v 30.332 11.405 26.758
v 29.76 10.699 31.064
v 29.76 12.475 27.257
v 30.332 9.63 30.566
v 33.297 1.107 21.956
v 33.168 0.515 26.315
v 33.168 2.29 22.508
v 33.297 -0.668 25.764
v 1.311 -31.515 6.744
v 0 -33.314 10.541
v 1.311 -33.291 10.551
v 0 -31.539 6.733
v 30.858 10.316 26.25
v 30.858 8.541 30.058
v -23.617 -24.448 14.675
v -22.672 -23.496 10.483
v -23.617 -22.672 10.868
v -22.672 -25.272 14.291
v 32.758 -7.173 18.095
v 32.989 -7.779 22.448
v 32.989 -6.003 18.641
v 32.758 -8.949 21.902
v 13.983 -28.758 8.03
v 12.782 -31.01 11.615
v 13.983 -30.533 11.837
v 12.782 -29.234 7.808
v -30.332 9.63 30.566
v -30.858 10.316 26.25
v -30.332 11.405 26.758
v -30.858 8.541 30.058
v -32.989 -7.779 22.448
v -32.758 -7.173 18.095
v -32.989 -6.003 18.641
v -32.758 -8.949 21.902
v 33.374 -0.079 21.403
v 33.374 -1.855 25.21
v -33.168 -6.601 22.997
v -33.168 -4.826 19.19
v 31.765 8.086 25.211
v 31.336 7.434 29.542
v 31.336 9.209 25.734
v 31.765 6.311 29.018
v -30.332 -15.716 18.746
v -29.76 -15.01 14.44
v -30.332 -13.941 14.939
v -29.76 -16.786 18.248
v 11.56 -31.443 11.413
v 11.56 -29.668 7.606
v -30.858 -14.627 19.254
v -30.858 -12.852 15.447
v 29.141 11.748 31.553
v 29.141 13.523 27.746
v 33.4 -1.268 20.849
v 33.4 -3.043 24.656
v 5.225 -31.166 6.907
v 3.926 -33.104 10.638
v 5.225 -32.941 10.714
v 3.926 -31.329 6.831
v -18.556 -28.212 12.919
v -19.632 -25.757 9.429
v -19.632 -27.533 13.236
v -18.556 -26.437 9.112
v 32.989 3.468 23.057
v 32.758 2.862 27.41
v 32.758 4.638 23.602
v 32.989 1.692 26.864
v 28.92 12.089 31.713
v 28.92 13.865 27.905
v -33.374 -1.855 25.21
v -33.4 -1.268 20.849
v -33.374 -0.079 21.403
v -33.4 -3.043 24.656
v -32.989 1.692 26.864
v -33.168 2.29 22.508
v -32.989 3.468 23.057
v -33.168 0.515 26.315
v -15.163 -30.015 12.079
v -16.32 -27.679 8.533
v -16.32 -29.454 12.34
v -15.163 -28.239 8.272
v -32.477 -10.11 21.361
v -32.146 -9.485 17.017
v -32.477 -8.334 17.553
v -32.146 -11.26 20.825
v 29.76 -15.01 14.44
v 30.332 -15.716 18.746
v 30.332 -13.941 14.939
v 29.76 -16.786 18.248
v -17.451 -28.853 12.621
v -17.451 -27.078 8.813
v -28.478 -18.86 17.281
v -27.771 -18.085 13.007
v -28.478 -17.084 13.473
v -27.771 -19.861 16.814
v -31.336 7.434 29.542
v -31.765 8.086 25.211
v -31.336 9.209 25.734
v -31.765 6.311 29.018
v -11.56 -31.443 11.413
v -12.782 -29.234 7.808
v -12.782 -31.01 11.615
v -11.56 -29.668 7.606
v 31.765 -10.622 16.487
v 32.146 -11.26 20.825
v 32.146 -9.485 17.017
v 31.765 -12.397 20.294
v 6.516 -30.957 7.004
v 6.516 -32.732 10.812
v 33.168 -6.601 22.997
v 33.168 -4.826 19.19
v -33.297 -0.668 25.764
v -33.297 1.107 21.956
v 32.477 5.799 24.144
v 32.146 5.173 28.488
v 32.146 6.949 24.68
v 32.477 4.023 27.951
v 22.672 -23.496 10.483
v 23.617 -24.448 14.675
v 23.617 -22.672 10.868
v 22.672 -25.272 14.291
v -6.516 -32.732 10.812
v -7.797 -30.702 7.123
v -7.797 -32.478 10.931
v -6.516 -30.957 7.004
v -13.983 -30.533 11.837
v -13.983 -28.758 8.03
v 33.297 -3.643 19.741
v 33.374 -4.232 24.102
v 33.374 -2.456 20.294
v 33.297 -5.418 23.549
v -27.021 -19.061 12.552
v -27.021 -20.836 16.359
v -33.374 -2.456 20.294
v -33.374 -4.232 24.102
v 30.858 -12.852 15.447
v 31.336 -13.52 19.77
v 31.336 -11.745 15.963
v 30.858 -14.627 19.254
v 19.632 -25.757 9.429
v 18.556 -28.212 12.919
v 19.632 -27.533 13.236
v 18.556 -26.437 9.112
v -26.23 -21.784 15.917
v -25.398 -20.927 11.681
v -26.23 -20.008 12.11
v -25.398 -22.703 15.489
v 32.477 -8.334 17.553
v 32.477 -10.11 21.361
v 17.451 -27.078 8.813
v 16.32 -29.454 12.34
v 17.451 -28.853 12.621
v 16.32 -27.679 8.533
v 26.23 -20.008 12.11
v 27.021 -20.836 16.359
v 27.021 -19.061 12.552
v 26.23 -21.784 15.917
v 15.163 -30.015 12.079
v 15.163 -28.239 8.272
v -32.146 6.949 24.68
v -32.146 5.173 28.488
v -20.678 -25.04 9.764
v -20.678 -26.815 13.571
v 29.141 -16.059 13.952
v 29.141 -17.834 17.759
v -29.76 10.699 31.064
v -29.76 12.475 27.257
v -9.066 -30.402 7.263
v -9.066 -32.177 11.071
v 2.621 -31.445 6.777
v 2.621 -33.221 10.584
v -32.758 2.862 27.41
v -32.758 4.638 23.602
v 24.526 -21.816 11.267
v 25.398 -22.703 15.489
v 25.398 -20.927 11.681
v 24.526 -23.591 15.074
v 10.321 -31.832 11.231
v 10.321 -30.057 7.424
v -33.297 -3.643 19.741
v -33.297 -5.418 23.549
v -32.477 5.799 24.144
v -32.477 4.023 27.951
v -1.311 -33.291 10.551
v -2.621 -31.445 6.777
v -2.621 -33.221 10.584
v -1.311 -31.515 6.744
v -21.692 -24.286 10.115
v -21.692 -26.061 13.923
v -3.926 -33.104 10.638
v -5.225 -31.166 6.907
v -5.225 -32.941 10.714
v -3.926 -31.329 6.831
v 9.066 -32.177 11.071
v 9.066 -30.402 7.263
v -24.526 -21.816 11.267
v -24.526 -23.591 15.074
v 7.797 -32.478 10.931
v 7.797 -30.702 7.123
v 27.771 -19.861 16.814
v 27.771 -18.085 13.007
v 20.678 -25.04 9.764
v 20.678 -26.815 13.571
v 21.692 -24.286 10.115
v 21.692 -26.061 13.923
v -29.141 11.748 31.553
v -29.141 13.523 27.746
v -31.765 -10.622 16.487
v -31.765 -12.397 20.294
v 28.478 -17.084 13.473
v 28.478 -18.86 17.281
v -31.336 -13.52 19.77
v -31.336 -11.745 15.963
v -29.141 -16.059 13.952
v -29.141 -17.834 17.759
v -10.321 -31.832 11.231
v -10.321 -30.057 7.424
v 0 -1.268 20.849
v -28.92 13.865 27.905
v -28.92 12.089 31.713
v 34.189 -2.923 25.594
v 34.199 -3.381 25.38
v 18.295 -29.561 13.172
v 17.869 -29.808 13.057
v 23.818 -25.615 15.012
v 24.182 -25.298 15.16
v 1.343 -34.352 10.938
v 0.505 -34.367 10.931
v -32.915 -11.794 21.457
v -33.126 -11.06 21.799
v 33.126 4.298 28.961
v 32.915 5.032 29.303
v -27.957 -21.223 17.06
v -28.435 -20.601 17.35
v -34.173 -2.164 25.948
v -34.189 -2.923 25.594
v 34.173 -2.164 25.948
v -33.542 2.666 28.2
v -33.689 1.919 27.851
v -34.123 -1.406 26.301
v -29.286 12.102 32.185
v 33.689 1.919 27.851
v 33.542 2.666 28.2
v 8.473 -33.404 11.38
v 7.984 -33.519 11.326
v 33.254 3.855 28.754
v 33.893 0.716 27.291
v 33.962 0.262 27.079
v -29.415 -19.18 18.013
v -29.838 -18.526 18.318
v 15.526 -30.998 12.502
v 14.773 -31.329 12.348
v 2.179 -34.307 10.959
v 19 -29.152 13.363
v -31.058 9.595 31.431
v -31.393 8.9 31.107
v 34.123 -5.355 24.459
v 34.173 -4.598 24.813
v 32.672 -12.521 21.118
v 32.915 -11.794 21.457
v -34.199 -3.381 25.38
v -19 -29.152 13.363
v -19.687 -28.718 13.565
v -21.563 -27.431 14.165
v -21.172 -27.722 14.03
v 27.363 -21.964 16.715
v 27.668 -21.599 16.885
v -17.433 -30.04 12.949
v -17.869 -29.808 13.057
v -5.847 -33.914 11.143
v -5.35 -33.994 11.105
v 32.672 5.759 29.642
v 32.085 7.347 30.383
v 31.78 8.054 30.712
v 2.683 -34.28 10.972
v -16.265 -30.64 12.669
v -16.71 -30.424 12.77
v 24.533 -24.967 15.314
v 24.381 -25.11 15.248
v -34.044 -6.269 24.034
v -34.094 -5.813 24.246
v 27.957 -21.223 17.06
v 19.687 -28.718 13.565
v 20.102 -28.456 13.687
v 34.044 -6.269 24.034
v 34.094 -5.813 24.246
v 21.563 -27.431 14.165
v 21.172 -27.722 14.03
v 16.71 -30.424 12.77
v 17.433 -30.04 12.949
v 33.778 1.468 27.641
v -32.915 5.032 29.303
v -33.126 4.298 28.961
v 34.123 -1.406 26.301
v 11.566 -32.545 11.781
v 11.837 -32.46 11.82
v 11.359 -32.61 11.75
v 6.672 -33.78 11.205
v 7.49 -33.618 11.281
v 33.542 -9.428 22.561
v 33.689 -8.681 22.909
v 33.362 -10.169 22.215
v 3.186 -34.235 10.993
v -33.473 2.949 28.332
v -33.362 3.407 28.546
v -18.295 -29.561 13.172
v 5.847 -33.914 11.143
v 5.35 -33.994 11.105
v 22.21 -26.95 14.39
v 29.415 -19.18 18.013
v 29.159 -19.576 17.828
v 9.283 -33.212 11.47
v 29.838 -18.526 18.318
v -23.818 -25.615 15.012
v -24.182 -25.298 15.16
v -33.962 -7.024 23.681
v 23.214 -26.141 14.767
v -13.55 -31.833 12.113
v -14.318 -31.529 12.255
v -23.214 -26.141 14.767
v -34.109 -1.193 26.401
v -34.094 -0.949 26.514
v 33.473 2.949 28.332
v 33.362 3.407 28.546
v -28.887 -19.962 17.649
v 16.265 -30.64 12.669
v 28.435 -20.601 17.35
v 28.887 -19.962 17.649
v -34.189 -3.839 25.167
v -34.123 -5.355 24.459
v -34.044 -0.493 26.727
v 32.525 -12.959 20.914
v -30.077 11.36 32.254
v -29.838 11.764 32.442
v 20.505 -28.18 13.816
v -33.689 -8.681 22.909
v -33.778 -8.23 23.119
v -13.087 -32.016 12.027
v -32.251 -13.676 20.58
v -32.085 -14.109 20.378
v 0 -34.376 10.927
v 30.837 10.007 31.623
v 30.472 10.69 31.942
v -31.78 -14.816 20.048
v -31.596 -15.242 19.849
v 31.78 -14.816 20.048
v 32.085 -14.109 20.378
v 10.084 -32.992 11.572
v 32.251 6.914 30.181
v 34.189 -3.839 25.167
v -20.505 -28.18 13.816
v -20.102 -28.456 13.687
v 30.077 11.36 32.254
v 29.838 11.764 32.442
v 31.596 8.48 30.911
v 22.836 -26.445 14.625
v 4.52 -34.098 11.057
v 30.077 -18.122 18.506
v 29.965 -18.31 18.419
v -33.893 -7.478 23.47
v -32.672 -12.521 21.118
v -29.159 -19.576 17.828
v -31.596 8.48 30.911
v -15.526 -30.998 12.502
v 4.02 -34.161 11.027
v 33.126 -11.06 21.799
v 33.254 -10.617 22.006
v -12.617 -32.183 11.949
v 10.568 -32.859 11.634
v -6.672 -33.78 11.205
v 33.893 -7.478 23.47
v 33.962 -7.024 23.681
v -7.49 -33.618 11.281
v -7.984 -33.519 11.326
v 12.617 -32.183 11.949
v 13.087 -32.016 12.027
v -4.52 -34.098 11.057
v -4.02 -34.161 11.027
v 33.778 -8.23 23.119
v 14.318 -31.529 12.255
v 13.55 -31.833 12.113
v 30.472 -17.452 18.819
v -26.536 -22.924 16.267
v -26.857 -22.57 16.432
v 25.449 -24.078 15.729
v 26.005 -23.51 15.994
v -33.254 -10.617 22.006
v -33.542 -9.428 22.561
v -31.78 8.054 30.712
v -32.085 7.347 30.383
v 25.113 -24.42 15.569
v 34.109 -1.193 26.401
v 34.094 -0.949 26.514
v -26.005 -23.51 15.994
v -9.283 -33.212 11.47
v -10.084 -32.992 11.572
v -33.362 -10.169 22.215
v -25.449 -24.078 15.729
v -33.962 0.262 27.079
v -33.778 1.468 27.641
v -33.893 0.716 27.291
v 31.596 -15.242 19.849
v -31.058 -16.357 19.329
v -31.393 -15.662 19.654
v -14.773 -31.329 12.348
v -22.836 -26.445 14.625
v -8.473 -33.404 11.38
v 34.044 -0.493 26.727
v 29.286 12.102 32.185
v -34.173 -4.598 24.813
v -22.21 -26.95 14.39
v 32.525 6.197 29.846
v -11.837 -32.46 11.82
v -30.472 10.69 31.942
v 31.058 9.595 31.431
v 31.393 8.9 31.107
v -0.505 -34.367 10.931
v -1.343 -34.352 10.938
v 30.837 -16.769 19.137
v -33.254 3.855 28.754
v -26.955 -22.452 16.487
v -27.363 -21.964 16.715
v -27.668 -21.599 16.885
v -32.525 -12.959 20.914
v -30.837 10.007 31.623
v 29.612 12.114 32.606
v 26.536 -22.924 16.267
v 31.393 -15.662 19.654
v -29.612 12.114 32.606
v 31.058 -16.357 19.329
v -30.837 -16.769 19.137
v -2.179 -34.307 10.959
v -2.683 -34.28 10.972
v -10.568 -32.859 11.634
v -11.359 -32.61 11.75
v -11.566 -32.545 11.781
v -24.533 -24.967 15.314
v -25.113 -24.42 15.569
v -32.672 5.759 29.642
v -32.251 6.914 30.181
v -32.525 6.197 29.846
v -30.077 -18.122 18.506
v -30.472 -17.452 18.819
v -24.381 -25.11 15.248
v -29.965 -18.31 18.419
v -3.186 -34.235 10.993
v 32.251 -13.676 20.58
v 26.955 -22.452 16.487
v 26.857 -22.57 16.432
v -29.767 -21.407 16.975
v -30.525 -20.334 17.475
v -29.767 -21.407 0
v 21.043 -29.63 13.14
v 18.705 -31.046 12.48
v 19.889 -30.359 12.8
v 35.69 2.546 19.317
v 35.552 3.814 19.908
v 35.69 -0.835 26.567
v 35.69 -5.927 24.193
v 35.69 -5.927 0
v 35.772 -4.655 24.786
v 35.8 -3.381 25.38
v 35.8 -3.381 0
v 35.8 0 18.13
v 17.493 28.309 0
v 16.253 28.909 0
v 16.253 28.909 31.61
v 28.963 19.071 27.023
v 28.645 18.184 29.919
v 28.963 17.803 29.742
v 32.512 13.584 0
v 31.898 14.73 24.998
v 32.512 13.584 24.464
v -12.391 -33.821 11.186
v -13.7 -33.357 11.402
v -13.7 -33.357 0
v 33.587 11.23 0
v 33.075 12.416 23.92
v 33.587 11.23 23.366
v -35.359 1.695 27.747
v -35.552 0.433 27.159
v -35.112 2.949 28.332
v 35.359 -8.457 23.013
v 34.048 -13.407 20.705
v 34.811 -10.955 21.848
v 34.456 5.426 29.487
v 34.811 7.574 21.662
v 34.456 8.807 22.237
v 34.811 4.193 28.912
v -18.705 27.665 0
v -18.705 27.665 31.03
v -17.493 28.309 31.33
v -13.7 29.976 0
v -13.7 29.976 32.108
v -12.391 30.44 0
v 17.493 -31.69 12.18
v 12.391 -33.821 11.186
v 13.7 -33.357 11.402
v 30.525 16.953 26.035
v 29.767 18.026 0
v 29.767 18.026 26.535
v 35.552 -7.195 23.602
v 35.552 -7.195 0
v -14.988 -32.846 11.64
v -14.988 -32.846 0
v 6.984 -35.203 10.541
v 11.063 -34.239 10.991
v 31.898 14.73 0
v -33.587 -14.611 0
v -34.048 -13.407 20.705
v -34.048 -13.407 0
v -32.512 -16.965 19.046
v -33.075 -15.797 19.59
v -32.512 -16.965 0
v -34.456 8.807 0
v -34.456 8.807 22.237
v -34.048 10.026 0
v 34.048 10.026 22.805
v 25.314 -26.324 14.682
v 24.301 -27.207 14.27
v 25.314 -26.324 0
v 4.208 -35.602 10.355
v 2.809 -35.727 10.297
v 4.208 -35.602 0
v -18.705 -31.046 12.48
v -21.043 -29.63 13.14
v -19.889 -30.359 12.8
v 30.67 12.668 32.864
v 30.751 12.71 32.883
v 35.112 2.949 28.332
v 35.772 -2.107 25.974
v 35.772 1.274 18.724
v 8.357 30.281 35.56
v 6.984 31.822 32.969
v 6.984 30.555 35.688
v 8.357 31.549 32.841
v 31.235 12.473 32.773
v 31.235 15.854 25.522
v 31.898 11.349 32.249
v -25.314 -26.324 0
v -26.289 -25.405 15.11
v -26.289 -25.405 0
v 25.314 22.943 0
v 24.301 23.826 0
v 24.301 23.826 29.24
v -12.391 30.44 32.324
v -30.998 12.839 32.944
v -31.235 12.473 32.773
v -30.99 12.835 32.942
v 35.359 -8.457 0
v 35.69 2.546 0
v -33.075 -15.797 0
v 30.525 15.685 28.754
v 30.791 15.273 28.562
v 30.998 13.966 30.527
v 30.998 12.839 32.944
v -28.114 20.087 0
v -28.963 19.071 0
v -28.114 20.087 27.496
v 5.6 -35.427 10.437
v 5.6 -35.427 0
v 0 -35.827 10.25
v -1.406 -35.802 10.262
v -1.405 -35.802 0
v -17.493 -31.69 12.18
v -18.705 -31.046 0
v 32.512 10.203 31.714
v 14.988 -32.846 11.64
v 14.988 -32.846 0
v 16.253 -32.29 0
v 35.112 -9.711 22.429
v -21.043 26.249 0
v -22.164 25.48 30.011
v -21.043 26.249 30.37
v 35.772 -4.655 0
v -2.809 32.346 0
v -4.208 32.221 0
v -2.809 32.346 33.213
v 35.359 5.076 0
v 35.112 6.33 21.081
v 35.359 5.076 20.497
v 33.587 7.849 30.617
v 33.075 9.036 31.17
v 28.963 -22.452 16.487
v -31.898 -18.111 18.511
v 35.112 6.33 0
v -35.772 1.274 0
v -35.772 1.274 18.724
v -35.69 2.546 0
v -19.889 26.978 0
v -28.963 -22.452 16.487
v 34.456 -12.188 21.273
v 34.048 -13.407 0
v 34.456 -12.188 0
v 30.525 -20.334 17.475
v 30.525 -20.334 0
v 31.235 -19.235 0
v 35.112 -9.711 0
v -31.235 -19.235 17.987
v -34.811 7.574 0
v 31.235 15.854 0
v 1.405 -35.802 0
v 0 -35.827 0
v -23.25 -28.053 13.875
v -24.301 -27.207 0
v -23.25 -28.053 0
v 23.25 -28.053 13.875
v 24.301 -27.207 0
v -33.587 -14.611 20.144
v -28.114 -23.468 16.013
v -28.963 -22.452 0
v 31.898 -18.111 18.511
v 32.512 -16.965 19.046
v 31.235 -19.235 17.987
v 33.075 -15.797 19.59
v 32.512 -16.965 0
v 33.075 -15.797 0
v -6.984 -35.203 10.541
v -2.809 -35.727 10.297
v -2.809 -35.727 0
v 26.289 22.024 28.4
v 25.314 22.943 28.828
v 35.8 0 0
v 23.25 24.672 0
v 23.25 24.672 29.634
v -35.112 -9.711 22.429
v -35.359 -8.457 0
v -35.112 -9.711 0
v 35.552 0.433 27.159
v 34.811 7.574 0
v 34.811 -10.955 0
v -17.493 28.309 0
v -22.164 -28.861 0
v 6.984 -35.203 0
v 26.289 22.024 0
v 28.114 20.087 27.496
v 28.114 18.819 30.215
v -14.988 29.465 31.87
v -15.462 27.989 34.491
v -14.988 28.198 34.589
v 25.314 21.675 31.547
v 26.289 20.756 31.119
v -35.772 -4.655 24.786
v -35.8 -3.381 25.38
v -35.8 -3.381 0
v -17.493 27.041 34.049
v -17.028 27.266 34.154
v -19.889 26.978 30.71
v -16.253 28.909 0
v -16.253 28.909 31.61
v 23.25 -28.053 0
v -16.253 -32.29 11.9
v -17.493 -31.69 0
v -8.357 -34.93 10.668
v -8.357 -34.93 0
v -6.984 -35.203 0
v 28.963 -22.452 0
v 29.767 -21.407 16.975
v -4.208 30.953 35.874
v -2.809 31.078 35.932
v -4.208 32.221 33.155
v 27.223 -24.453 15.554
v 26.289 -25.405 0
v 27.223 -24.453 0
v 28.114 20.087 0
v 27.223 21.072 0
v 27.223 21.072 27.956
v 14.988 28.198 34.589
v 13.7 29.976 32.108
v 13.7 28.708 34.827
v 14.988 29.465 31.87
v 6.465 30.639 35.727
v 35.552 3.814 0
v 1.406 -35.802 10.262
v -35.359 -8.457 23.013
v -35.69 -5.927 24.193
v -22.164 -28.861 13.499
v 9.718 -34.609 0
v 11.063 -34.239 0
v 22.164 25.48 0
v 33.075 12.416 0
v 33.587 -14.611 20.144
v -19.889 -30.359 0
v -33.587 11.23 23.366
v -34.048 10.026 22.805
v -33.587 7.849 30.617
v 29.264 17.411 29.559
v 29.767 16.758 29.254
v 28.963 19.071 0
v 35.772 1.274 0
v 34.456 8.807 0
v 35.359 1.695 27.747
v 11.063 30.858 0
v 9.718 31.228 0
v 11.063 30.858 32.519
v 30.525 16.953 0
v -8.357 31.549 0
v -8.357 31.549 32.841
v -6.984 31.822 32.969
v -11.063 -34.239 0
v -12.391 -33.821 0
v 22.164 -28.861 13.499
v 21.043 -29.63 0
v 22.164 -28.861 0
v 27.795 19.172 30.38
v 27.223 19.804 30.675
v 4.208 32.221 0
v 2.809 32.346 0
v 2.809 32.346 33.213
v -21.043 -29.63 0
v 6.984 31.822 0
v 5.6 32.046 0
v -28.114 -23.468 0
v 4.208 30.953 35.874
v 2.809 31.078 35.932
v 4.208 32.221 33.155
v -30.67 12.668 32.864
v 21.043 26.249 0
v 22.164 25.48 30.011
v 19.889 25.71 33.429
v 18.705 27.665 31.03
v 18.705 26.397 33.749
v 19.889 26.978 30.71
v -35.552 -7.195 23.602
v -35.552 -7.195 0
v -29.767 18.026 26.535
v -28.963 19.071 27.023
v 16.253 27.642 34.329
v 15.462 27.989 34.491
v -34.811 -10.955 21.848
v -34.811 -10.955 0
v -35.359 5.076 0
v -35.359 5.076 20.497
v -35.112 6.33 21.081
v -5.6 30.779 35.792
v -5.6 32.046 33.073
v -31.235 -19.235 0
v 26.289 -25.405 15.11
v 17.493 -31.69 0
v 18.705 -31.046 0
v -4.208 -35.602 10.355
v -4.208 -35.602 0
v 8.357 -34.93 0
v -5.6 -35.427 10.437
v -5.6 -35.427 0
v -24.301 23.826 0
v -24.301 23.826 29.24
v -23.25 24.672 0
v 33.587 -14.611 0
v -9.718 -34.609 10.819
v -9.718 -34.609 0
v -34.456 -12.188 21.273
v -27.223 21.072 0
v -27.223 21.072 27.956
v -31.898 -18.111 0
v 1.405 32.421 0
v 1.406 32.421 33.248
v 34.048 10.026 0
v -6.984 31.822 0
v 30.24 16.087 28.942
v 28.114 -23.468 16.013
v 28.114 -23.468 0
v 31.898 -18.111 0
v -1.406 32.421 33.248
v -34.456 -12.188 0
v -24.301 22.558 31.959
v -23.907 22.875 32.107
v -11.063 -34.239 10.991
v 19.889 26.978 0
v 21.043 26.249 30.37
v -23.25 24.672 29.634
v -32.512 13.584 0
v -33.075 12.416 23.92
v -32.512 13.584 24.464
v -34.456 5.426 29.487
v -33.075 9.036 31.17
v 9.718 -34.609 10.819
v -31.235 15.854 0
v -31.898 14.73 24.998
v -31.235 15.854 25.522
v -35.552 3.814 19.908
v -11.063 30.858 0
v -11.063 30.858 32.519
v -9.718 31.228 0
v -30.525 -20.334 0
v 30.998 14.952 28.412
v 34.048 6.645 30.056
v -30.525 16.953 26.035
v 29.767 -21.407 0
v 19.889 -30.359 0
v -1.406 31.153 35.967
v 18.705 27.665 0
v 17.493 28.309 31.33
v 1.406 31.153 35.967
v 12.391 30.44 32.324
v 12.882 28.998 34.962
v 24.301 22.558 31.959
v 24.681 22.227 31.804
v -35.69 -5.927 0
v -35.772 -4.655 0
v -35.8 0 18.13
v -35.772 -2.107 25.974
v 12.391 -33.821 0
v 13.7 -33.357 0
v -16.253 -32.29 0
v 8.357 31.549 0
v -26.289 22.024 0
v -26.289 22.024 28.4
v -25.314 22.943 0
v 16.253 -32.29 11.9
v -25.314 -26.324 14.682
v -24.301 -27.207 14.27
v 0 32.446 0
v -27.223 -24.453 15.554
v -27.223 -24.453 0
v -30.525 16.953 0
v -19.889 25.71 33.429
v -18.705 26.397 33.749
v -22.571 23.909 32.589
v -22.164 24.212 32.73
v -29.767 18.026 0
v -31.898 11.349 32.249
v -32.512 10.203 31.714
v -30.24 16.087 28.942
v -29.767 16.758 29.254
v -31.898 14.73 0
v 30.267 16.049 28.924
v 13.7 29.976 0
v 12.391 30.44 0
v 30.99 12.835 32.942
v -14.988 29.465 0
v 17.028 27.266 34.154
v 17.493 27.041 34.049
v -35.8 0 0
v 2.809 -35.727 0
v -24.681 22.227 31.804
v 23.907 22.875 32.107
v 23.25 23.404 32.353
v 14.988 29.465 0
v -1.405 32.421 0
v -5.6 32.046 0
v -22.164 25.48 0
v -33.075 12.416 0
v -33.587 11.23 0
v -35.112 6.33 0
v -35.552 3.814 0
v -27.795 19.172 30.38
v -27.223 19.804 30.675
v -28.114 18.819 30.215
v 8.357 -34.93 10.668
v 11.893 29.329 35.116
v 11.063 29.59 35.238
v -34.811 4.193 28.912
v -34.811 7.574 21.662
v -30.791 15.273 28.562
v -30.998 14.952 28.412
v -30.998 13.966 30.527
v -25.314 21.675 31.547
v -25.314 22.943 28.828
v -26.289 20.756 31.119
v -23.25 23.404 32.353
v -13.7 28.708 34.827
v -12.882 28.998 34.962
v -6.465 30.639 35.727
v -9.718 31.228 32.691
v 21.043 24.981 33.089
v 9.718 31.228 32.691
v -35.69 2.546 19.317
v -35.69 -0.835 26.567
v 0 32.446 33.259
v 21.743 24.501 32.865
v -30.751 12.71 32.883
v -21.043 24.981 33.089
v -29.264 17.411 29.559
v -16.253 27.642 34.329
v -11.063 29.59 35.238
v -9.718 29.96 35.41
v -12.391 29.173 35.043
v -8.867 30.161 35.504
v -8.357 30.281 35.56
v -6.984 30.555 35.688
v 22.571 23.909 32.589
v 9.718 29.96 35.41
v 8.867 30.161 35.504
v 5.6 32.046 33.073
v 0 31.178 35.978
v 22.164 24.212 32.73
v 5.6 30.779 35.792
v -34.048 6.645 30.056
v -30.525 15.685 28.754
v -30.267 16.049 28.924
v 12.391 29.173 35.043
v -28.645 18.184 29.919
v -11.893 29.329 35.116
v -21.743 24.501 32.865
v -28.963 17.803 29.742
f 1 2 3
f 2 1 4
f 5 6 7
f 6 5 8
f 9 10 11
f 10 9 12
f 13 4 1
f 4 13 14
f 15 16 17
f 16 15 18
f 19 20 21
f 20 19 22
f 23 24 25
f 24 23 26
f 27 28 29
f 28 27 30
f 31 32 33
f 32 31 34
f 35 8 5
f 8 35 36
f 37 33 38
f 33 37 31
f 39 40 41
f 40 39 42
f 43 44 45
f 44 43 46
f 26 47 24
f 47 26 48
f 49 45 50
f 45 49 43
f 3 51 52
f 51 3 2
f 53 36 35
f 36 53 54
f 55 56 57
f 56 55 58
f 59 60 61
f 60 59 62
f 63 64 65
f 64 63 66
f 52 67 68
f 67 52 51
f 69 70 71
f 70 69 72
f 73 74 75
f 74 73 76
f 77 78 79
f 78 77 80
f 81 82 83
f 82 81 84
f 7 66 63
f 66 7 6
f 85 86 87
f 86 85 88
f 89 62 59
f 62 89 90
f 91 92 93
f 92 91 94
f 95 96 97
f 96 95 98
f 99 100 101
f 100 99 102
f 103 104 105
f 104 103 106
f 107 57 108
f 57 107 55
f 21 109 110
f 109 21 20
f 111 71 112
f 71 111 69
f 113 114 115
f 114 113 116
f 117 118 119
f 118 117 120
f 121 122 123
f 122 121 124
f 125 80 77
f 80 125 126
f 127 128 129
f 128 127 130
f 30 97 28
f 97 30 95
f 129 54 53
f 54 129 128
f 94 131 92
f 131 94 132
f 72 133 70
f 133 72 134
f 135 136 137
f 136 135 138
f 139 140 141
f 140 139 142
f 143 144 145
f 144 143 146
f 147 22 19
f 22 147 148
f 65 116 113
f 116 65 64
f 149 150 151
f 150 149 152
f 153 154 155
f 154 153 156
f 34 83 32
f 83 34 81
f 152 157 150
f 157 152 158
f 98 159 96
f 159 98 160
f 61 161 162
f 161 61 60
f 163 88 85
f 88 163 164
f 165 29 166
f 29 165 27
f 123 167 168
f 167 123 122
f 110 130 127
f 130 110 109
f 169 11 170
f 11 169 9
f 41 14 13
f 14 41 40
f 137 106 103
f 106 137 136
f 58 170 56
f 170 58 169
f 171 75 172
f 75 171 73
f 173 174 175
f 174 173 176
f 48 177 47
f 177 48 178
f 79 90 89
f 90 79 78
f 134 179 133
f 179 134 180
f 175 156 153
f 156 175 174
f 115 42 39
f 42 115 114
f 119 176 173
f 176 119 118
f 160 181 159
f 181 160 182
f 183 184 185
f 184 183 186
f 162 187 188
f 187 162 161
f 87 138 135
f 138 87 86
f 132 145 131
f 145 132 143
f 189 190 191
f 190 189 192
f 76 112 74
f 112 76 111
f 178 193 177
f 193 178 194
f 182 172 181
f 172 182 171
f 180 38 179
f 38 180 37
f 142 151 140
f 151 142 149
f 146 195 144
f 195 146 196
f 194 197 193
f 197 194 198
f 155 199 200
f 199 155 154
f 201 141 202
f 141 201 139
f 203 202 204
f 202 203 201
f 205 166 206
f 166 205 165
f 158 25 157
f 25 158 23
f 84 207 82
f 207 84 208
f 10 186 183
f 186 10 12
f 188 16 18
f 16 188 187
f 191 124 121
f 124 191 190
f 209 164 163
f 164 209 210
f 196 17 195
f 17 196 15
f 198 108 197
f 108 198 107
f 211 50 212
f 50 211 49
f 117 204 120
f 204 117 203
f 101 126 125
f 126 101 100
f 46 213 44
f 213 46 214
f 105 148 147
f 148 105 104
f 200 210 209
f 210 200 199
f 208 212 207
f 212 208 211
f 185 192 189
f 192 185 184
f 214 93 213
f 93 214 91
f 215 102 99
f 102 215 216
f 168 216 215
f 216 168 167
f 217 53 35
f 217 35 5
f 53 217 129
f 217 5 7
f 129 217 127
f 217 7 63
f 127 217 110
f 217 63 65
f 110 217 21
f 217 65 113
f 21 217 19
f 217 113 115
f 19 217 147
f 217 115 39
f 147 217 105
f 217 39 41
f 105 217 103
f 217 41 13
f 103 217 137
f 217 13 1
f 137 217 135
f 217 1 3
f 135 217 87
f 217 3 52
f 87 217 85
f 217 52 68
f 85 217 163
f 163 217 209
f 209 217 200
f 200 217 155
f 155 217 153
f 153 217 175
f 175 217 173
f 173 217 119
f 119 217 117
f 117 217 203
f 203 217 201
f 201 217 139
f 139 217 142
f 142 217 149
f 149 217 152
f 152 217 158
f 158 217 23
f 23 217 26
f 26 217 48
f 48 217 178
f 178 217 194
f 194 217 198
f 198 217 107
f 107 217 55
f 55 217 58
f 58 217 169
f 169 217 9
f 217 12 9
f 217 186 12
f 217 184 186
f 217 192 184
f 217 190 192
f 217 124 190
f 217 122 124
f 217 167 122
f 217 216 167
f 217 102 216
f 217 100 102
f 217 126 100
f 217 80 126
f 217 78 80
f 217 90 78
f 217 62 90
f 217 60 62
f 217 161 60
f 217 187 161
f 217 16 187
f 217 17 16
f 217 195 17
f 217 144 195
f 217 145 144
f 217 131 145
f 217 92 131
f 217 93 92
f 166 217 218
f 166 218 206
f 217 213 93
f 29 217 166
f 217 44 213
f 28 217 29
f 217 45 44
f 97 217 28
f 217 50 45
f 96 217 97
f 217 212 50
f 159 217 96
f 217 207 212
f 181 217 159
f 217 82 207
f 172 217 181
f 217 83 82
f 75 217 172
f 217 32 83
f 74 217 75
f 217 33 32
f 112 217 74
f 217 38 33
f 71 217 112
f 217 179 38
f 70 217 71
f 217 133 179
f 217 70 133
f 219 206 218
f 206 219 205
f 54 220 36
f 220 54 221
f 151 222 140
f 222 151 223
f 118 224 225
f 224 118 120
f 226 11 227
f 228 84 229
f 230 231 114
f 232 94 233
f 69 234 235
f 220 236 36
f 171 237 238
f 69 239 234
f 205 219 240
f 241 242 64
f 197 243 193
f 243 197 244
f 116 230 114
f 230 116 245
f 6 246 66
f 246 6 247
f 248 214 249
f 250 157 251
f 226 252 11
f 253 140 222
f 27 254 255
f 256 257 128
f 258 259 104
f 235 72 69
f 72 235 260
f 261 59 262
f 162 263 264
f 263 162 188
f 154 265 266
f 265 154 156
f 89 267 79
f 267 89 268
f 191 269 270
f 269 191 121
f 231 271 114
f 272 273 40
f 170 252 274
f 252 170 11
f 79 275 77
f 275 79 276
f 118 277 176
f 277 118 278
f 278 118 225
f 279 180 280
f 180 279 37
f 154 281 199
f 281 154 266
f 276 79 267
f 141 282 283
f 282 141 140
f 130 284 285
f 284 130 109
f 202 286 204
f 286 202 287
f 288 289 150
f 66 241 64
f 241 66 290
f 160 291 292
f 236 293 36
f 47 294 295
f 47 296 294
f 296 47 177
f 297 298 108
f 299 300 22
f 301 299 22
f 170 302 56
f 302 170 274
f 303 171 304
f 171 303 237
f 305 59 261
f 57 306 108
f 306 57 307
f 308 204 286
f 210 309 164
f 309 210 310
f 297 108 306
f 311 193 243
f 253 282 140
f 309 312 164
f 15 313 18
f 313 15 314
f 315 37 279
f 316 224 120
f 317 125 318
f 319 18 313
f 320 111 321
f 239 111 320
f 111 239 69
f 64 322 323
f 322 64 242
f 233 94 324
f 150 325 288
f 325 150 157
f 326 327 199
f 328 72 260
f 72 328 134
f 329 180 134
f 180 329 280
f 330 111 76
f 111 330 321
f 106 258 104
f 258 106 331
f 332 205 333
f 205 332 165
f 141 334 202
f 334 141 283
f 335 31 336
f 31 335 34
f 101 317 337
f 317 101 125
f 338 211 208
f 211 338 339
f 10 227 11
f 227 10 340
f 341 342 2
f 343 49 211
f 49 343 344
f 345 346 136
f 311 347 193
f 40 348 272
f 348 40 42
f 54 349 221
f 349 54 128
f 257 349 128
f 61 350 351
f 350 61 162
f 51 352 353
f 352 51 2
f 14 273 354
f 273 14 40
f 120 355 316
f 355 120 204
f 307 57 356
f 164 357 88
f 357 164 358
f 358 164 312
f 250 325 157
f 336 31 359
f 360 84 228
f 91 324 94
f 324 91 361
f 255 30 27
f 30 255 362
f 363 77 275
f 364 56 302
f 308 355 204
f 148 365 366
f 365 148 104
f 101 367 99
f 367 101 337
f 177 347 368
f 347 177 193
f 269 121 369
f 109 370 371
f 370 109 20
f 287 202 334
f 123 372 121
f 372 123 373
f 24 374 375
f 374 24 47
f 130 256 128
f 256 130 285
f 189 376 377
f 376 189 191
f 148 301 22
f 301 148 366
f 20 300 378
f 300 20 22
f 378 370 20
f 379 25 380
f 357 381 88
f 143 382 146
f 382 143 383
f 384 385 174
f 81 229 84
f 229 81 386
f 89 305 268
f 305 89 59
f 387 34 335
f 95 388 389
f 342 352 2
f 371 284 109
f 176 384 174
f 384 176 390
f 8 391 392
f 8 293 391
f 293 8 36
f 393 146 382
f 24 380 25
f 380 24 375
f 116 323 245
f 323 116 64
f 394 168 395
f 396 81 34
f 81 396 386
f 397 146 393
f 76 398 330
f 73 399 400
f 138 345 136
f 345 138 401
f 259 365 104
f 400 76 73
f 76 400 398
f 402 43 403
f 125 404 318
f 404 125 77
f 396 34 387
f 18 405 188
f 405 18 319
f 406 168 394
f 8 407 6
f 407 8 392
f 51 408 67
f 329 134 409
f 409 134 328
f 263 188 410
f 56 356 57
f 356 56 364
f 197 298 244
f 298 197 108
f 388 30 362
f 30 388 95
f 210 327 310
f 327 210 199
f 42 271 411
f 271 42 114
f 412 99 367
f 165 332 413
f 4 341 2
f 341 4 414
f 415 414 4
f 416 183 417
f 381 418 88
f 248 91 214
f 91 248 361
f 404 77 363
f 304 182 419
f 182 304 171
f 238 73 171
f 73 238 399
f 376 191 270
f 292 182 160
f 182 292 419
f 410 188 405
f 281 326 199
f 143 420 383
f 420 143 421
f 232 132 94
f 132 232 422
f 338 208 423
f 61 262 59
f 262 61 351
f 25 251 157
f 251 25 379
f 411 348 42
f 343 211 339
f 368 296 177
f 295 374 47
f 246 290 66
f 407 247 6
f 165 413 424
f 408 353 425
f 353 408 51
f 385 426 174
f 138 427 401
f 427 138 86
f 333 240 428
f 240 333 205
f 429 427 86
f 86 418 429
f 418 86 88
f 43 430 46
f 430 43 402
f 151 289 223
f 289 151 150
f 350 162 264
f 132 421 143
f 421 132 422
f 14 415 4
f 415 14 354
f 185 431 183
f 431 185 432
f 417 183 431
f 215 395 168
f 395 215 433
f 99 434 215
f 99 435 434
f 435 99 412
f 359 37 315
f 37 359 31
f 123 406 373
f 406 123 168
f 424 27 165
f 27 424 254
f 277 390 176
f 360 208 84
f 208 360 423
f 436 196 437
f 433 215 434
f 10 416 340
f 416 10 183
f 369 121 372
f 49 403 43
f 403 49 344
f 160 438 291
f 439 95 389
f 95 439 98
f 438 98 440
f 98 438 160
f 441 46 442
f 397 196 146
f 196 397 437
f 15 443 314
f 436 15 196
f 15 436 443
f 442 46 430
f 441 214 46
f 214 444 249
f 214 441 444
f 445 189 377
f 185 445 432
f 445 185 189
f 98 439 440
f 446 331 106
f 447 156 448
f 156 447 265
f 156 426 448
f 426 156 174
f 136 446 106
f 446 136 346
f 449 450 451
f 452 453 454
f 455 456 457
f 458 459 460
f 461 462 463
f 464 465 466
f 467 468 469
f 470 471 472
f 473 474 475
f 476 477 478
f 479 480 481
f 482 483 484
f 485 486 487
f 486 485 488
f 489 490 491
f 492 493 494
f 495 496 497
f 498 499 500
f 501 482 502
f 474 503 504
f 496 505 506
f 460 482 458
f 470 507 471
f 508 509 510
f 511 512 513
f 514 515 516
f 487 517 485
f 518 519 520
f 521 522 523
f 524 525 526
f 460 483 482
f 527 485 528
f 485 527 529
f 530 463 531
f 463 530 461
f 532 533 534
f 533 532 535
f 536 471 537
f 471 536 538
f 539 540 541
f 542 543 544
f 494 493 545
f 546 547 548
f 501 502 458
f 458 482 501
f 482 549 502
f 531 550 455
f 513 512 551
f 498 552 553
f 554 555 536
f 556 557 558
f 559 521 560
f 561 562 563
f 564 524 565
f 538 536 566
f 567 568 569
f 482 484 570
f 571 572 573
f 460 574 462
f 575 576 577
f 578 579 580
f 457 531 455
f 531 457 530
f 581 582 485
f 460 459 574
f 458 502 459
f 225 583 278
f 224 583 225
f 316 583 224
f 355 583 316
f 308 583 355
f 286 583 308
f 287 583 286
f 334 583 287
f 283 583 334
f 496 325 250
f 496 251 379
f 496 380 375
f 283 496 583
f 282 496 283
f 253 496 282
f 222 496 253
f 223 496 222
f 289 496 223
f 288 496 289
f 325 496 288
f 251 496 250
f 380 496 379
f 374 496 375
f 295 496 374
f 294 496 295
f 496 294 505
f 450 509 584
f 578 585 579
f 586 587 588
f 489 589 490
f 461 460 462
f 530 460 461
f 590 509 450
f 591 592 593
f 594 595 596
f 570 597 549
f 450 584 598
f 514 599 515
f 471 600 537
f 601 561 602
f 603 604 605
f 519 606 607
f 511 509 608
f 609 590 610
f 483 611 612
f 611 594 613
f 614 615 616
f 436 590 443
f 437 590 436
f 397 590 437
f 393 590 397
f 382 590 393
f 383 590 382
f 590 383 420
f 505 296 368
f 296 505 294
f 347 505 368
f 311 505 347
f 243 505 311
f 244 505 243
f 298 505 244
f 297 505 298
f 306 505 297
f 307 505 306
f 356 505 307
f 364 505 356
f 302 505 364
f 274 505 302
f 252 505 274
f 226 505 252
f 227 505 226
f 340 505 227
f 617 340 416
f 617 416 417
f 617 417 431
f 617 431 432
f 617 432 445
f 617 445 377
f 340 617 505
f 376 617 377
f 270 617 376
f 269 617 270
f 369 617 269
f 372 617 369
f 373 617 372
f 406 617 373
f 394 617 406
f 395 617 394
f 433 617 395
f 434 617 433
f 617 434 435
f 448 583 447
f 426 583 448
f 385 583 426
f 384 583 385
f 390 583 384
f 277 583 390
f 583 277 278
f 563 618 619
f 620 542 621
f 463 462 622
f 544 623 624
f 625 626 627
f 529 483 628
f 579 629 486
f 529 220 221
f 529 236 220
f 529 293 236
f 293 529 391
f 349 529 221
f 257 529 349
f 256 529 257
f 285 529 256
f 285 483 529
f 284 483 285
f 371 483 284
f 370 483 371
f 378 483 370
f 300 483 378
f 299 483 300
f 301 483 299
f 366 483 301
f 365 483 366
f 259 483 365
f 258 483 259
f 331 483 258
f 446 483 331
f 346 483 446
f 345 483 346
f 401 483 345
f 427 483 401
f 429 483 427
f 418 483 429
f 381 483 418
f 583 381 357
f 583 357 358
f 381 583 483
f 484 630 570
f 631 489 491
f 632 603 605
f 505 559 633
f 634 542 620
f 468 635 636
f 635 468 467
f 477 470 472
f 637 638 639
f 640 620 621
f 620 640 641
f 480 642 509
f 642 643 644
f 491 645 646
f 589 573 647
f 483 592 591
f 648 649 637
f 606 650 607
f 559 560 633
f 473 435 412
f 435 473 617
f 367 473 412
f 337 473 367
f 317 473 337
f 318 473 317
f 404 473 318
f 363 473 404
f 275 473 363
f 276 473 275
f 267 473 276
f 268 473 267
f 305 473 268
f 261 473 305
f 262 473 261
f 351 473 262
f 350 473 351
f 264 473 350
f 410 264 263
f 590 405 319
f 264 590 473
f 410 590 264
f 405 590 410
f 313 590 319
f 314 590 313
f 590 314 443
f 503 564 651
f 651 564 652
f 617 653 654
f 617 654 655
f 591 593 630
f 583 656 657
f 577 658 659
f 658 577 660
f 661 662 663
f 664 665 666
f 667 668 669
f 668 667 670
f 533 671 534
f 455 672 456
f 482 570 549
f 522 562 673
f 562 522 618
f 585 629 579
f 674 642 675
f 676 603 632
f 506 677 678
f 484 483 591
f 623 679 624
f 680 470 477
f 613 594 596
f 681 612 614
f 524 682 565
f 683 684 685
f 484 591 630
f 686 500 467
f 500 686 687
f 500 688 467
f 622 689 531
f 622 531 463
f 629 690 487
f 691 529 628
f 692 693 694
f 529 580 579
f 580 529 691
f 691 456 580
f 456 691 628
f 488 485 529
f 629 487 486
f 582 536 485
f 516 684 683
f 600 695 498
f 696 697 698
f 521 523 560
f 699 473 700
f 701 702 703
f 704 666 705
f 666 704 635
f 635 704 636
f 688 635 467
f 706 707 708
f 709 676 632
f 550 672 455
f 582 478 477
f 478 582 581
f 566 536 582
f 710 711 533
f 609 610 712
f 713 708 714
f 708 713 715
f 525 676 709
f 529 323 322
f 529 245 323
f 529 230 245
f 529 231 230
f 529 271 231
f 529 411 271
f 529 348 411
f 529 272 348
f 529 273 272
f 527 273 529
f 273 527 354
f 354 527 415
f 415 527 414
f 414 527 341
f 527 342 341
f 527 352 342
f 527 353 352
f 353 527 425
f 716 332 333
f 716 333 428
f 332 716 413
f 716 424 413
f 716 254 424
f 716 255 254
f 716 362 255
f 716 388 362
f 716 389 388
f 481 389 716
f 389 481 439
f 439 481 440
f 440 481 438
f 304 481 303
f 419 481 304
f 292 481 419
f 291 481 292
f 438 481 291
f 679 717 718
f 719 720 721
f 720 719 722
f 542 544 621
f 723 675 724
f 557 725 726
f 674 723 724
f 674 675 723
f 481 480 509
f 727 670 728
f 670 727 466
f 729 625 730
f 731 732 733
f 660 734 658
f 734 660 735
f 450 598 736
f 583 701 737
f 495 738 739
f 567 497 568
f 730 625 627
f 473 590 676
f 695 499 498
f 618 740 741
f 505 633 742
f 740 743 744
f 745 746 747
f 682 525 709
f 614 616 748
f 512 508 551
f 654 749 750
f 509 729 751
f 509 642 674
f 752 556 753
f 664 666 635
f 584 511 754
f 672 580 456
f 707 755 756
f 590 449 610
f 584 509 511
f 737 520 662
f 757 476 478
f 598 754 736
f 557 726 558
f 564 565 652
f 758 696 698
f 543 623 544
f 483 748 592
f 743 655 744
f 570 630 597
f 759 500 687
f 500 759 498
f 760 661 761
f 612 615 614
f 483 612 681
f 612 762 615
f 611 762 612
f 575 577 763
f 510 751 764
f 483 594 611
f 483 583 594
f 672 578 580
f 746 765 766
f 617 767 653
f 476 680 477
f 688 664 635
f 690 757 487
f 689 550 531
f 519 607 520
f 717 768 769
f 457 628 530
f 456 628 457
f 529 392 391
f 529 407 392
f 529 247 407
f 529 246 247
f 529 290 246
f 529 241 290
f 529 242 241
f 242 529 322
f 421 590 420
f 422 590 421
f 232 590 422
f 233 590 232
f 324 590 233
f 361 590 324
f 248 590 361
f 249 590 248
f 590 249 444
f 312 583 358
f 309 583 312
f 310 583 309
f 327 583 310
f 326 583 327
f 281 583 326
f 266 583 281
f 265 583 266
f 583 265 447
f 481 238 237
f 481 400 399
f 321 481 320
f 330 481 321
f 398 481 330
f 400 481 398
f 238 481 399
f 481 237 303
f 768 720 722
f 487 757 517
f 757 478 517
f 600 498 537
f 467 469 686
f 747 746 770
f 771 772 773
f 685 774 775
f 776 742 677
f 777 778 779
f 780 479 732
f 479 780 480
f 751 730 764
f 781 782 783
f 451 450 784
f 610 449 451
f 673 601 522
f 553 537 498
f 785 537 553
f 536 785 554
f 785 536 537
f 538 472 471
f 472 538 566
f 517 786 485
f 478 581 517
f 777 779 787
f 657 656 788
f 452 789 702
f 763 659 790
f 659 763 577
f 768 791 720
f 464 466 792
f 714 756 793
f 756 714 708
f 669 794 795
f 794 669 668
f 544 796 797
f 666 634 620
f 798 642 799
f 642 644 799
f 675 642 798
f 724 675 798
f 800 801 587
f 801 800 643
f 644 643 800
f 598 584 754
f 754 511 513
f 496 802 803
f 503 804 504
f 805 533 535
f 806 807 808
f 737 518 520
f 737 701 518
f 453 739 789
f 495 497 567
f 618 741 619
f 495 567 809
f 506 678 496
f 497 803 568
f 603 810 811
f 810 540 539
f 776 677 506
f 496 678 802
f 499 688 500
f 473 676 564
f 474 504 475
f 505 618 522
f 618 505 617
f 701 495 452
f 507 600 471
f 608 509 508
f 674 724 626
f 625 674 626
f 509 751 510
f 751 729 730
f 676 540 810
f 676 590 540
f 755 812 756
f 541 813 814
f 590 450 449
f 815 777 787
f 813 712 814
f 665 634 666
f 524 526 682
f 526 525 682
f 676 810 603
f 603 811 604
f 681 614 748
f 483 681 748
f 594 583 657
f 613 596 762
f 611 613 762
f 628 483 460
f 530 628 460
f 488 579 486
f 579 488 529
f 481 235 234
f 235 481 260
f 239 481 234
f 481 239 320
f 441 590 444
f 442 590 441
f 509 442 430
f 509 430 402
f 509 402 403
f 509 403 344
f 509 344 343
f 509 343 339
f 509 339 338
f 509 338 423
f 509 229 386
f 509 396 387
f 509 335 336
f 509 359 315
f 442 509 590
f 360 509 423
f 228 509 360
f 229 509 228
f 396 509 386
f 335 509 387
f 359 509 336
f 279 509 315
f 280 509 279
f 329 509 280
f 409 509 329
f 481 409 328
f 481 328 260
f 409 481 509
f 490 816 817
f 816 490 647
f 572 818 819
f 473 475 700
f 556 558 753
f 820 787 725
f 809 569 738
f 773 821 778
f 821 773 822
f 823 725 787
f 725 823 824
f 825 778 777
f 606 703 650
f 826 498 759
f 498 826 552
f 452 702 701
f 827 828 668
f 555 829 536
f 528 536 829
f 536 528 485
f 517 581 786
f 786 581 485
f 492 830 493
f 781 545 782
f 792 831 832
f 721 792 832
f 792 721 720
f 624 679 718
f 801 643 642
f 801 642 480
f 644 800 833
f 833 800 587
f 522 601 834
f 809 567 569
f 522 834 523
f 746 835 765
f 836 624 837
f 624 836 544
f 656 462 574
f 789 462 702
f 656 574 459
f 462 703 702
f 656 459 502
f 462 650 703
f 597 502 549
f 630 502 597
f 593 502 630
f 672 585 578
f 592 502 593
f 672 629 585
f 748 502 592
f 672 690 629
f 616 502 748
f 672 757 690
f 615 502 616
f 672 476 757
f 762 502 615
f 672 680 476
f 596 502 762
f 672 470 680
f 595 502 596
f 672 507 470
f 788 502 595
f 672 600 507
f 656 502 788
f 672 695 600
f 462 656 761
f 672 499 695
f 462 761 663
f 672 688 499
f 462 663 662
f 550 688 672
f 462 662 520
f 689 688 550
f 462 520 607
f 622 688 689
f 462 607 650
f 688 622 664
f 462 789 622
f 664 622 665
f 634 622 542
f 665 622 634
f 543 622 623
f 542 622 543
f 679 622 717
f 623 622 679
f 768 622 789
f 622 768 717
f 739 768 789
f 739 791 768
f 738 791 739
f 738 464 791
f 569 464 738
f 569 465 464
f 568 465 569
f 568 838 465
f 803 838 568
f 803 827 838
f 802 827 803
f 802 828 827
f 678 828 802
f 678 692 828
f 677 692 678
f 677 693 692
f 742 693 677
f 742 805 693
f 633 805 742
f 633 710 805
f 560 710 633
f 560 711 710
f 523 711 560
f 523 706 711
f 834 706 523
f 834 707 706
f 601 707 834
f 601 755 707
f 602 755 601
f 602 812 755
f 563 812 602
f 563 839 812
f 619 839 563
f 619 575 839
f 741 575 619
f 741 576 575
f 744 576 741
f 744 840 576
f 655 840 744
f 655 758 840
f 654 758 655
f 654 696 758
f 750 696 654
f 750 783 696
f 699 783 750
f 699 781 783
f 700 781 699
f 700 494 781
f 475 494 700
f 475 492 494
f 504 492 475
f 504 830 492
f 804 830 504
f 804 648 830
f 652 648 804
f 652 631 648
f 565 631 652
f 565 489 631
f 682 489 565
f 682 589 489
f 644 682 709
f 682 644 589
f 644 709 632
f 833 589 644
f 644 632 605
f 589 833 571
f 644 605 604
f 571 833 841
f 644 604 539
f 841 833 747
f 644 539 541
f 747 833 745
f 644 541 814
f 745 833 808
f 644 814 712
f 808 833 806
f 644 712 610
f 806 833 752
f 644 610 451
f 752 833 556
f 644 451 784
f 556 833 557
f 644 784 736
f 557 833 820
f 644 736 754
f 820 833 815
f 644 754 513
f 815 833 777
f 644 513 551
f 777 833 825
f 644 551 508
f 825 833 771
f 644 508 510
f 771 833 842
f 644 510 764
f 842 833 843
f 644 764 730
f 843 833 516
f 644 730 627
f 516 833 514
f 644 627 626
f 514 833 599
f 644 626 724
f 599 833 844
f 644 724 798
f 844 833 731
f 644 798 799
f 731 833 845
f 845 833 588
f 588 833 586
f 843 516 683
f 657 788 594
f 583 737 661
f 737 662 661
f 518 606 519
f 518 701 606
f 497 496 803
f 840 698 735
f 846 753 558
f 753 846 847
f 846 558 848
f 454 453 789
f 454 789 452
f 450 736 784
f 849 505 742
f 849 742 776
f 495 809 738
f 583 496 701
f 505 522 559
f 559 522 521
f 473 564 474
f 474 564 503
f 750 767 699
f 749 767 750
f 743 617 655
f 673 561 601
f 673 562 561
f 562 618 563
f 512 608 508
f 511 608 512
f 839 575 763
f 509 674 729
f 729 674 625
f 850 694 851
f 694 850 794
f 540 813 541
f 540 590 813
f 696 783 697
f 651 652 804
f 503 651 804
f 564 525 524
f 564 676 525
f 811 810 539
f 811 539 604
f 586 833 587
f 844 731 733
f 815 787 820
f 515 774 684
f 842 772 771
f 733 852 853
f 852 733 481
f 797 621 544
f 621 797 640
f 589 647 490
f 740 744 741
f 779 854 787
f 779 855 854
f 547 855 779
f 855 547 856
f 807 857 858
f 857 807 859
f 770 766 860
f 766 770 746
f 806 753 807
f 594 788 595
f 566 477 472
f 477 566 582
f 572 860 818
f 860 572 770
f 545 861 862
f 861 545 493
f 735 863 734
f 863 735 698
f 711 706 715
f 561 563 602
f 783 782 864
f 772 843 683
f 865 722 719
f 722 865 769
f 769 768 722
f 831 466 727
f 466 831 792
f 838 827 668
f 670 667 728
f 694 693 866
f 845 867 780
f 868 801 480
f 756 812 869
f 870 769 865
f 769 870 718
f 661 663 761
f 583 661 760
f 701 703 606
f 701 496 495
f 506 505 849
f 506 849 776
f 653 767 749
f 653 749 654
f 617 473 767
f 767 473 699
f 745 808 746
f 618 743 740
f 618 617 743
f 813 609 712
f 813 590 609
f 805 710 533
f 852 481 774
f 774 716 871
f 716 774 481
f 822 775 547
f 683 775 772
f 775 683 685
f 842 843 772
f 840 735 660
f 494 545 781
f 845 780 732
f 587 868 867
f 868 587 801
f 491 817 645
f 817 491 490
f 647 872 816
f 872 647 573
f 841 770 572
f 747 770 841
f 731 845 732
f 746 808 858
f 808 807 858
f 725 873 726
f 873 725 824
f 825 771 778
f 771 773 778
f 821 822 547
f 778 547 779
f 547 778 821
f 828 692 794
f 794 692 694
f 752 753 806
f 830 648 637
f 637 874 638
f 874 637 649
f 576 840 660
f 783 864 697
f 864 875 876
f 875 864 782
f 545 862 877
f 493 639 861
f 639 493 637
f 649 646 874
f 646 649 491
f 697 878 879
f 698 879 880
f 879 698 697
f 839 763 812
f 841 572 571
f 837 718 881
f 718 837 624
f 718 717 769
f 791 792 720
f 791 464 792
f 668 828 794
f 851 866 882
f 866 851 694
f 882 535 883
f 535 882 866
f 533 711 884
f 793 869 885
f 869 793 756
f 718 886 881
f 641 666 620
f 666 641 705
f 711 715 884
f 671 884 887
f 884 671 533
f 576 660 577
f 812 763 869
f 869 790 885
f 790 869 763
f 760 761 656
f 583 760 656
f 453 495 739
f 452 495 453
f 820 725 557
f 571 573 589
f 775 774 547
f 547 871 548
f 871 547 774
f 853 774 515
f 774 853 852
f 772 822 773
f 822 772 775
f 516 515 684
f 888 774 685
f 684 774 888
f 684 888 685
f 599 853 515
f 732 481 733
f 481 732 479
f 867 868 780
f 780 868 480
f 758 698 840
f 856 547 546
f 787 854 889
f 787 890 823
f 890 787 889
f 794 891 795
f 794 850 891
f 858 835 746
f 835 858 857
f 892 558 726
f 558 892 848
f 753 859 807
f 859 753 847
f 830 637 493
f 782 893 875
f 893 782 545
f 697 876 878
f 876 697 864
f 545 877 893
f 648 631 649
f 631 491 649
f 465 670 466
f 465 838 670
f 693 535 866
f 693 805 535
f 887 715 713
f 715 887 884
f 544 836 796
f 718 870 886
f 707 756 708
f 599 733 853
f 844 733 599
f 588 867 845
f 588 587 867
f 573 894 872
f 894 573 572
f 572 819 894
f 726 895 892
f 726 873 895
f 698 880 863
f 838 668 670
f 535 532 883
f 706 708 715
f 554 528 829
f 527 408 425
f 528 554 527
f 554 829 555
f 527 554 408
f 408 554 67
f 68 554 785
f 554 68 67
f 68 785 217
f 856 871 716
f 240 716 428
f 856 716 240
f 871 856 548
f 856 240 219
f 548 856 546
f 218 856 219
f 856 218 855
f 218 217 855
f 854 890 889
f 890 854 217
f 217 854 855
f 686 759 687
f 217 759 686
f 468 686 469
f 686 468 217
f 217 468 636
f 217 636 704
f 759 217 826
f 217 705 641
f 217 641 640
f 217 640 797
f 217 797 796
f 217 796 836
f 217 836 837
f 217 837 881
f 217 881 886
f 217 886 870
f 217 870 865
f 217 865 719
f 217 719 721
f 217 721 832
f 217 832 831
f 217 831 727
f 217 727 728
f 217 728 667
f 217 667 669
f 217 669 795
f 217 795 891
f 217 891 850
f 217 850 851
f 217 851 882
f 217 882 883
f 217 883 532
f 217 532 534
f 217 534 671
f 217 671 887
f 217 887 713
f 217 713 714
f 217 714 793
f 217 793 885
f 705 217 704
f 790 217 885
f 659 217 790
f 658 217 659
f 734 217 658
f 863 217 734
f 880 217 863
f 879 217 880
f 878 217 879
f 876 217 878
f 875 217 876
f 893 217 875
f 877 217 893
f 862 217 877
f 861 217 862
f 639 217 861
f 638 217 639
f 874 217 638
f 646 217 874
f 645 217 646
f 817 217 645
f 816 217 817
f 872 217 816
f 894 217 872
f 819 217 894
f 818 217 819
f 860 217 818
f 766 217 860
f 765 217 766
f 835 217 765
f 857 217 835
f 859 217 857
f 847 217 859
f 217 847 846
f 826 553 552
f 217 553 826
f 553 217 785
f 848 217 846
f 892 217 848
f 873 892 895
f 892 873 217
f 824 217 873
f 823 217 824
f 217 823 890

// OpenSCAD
// Tilted desk stand for the Waveshare ESP32-S3-Knob-Touch-LCD-1.8.
// The cup grips only the black base: the blue ring above it is the encoder
// and must turn freely. Prints flat as modelled, no supports.

/* [Device] */
device_d     = 66.0;  // Waveshare drawing: 66 mm
base_band_h  = 9.0;   // black base below the rotating ring (22 mm total)
clearance    = 0.4;   // radial, per side

/* [Stand] */
tilt         = 25;    // screen tilt back from horizontal
wall         = 2.4;
floor_t      = 3.0;
lip_h        = 5.0;   // must stay below base_band_h so the ring clears
ground_gap   = 3.0;   // stand height under the cup's lowest point
port_angle   = 90;    // 90 = ports face the back; turn to match your UI's "up"
port_span    = 120;   // USB-C, jack, power switch, BOOT and mic span ~75°
lead_in      = 0.8;   // chamfer at the cup mouth

$fn = 160;

assert(lip_h < base_band_h - 1, "lip would rub the rotating ring");

r_pocket = device_d / 2 + clearance;
r_outer  = r_pocket + wall;
cup_h    = floor_t + lip_h;
lift     = r_outer * sin(tilt) + ground_gap;

module tilted() {
    translate([0, 0, lift]) rotate([tilt, 0, 0]) children();
}

module cup_solid() {
    tilted() cylinder(r = r_outer, h = cup_h);
}

module body() {
    hull() {
        cup_solid();
        linear_extrude(0.01) projection() cup_solid();
    }
}

module pocket() {
    tilted() translate([0, 0, floor_t]) {
        cylinder(r = r_pocket, h = 60);
        translate([0, 0, lip_h - lead_in + 0.001])
            cylinder(r1 = r_pocket, r2 = r_pocket + lead_in + 0.5, h = lead_in + 0.5);
    }
}

// Opens the wall and everything above the floor in the ports' direction so
// USB-C plugs and the headphone jack go straight in.
module port_cutout() {
    tilted() translate([0, 0, floor_t])
        rotate([0, 0, port_angle - port_span / 2])
            rotate_extrude(angle = port_span) square([80, 60]);
}

difference() {
    body();
    pocket();
    port_cutout();
}
